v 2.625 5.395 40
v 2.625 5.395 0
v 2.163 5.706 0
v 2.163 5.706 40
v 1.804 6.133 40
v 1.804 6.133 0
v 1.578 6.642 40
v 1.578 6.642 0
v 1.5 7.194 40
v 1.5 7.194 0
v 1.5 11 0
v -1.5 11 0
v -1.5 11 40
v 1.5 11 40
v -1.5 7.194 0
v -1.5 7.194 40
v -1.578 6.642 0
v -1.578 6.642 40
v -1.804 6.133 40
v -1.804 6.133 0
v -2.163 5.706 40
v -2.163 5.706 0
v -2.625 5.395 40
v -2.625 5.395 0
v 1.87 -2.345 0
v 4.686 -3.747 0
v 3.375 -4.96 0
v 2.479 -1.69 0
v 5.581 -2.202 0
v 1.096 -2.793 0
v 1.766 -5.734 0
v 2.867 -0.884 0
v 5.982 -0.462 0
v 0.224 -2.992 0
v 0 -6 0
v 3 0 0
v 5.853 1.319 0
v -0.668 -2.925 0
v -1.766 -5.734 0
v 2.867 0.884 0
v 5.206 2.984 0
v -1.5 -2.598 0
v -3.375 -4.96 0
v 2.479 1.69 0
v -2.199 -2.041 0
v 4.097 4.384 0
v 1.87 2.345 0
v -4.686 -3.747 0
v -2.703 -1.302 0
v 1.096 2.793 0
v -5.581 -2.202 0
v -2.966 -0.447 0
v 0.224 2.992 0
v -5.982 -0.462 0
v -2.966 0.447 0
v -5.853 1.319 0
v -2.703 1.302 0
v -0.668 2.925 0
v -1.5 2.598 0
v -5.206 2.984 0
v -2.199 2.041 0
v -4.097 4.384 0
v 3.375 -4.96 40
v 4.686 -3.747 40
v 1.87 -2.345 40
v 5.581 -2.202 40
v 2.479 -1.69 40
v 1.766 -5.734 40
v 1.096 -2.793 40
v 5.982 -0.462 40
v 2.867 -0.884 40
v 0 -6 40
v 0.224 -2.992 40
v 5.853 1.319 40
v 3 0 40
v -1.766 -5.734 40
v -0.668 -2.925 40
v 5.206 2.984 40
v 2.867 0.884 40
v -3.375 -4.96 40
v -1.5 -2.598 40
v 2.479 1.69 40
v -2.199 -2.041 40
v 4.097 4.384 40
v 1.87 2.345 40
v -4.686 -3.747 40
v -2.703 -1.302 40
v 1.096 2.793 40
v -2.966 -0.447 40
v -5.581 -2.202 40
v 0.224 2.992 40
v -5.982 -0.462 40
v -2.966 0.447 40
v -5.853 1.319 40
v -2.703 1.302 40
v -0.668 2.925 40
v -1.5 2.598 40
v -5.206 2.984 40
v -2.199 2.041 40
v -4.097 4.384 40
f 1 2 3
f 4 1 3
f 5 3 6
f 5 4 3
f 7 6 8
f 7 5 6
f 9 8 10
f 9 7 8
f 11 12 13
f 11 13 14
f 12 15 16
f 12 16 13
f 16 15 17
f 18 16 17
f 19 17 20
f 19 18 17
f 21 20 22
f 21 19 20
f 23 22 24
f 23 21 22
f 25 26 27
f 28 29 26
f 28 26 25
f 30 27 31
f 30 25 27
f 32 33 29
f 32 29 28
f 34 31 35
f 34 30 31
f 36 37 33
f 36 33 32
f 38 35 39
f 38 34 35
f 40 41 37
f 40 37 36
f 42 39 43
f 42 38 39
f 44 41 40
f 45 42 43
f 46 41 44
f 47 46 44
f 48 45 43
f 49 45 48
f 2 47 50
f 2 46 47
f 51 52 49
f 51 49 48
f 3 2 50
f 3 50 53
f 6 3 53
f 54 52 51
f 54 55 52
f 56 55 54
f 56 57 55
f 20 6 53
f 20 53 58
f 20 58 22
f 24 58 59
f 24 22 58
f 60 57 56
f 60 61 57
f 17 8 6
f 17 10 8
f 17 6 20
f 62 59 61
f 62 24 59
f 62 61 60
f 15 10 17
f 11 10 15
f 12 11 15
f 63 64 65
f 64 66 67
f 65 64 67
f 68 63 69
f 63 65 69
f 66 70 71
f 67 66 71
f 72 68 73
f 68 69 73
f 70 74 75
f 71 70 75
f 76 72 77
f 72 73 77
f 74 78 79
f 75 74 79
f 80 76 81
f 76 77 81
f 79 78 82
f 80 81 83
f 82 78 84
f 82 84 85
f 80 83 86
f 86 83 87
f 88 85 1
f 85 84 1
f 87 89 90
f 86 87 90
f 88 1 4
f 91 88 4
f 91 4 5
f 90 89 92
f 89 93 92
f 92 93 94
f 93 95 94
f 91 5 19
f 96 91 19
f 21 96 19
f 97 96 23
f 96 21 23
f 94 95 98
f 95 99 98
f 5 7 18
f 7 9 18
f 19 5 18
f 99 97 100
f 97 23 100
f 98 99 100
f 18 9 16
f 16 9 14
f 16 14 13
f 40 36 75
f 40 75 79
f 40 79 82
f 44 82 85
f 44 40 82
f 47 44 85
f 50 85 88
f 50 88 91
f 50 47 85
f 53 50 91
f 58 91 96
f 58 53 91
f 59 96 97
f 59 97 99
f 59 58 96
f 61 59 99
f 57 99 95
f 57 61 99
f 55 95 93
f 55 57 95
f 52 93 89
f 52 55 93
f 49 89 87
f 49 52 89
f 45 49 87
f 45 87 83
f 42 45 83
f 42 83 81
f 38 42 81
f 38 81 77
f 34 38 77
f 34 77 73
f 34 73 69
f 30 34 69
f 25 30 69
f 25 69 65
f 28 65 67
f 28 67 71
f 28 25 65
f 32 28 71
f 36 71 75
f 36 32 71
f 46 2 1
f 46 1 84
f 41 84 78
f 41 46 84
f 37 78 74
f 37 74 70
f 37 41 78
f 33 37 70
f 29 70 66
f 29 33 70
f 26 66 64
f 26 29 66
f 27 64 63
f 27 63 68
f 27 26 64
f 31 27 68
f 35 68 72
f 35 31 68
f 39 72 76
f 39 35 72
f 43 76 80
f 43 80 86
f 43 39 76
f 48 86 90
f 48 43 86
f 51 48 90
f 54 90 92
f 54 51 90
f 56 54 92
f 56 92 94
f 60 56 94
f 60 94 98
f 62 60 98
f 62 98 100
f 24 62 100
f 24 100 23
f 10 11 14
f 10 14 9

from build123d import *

# Parameters (mm, degrees)
SKETCH1_R           = 3
BOSS_EXTRUDE1_DEPTH = 40
FILLET1_R           = 2


with BuildPart() as part:
    # Sketch1 → Boss-Extrude1 (new body)
    with BuildSketch(Plane.XY):
        with BuildLine():
            Line((-1.5, 5.809475019), (-1.5, 11))
            Line((-1.5, 11), (1.5, 11))
            Line((1.5, 11), (1.5, 5.809475019))
            ThreePointArc((1.5, 5.809475019), (0, -6), (-1.5, 5.809475019))
        make_face()
        Circle(SKETCH1_R, mode=Mode.SUBTRACT)
    extrude(amount=BOSS_EXTRUDE1_DEPTH)

    # Fillet1
    fillet1_edges = [part.edges().sort_by_distance(p)[0] for p in [
        (1.5, 5.809475019, 20),
        (-1.5, 5.809475019, 20),
    ]]
    fillet(fillet1_edges, radius=FILLET1_R)


solid = part.part
